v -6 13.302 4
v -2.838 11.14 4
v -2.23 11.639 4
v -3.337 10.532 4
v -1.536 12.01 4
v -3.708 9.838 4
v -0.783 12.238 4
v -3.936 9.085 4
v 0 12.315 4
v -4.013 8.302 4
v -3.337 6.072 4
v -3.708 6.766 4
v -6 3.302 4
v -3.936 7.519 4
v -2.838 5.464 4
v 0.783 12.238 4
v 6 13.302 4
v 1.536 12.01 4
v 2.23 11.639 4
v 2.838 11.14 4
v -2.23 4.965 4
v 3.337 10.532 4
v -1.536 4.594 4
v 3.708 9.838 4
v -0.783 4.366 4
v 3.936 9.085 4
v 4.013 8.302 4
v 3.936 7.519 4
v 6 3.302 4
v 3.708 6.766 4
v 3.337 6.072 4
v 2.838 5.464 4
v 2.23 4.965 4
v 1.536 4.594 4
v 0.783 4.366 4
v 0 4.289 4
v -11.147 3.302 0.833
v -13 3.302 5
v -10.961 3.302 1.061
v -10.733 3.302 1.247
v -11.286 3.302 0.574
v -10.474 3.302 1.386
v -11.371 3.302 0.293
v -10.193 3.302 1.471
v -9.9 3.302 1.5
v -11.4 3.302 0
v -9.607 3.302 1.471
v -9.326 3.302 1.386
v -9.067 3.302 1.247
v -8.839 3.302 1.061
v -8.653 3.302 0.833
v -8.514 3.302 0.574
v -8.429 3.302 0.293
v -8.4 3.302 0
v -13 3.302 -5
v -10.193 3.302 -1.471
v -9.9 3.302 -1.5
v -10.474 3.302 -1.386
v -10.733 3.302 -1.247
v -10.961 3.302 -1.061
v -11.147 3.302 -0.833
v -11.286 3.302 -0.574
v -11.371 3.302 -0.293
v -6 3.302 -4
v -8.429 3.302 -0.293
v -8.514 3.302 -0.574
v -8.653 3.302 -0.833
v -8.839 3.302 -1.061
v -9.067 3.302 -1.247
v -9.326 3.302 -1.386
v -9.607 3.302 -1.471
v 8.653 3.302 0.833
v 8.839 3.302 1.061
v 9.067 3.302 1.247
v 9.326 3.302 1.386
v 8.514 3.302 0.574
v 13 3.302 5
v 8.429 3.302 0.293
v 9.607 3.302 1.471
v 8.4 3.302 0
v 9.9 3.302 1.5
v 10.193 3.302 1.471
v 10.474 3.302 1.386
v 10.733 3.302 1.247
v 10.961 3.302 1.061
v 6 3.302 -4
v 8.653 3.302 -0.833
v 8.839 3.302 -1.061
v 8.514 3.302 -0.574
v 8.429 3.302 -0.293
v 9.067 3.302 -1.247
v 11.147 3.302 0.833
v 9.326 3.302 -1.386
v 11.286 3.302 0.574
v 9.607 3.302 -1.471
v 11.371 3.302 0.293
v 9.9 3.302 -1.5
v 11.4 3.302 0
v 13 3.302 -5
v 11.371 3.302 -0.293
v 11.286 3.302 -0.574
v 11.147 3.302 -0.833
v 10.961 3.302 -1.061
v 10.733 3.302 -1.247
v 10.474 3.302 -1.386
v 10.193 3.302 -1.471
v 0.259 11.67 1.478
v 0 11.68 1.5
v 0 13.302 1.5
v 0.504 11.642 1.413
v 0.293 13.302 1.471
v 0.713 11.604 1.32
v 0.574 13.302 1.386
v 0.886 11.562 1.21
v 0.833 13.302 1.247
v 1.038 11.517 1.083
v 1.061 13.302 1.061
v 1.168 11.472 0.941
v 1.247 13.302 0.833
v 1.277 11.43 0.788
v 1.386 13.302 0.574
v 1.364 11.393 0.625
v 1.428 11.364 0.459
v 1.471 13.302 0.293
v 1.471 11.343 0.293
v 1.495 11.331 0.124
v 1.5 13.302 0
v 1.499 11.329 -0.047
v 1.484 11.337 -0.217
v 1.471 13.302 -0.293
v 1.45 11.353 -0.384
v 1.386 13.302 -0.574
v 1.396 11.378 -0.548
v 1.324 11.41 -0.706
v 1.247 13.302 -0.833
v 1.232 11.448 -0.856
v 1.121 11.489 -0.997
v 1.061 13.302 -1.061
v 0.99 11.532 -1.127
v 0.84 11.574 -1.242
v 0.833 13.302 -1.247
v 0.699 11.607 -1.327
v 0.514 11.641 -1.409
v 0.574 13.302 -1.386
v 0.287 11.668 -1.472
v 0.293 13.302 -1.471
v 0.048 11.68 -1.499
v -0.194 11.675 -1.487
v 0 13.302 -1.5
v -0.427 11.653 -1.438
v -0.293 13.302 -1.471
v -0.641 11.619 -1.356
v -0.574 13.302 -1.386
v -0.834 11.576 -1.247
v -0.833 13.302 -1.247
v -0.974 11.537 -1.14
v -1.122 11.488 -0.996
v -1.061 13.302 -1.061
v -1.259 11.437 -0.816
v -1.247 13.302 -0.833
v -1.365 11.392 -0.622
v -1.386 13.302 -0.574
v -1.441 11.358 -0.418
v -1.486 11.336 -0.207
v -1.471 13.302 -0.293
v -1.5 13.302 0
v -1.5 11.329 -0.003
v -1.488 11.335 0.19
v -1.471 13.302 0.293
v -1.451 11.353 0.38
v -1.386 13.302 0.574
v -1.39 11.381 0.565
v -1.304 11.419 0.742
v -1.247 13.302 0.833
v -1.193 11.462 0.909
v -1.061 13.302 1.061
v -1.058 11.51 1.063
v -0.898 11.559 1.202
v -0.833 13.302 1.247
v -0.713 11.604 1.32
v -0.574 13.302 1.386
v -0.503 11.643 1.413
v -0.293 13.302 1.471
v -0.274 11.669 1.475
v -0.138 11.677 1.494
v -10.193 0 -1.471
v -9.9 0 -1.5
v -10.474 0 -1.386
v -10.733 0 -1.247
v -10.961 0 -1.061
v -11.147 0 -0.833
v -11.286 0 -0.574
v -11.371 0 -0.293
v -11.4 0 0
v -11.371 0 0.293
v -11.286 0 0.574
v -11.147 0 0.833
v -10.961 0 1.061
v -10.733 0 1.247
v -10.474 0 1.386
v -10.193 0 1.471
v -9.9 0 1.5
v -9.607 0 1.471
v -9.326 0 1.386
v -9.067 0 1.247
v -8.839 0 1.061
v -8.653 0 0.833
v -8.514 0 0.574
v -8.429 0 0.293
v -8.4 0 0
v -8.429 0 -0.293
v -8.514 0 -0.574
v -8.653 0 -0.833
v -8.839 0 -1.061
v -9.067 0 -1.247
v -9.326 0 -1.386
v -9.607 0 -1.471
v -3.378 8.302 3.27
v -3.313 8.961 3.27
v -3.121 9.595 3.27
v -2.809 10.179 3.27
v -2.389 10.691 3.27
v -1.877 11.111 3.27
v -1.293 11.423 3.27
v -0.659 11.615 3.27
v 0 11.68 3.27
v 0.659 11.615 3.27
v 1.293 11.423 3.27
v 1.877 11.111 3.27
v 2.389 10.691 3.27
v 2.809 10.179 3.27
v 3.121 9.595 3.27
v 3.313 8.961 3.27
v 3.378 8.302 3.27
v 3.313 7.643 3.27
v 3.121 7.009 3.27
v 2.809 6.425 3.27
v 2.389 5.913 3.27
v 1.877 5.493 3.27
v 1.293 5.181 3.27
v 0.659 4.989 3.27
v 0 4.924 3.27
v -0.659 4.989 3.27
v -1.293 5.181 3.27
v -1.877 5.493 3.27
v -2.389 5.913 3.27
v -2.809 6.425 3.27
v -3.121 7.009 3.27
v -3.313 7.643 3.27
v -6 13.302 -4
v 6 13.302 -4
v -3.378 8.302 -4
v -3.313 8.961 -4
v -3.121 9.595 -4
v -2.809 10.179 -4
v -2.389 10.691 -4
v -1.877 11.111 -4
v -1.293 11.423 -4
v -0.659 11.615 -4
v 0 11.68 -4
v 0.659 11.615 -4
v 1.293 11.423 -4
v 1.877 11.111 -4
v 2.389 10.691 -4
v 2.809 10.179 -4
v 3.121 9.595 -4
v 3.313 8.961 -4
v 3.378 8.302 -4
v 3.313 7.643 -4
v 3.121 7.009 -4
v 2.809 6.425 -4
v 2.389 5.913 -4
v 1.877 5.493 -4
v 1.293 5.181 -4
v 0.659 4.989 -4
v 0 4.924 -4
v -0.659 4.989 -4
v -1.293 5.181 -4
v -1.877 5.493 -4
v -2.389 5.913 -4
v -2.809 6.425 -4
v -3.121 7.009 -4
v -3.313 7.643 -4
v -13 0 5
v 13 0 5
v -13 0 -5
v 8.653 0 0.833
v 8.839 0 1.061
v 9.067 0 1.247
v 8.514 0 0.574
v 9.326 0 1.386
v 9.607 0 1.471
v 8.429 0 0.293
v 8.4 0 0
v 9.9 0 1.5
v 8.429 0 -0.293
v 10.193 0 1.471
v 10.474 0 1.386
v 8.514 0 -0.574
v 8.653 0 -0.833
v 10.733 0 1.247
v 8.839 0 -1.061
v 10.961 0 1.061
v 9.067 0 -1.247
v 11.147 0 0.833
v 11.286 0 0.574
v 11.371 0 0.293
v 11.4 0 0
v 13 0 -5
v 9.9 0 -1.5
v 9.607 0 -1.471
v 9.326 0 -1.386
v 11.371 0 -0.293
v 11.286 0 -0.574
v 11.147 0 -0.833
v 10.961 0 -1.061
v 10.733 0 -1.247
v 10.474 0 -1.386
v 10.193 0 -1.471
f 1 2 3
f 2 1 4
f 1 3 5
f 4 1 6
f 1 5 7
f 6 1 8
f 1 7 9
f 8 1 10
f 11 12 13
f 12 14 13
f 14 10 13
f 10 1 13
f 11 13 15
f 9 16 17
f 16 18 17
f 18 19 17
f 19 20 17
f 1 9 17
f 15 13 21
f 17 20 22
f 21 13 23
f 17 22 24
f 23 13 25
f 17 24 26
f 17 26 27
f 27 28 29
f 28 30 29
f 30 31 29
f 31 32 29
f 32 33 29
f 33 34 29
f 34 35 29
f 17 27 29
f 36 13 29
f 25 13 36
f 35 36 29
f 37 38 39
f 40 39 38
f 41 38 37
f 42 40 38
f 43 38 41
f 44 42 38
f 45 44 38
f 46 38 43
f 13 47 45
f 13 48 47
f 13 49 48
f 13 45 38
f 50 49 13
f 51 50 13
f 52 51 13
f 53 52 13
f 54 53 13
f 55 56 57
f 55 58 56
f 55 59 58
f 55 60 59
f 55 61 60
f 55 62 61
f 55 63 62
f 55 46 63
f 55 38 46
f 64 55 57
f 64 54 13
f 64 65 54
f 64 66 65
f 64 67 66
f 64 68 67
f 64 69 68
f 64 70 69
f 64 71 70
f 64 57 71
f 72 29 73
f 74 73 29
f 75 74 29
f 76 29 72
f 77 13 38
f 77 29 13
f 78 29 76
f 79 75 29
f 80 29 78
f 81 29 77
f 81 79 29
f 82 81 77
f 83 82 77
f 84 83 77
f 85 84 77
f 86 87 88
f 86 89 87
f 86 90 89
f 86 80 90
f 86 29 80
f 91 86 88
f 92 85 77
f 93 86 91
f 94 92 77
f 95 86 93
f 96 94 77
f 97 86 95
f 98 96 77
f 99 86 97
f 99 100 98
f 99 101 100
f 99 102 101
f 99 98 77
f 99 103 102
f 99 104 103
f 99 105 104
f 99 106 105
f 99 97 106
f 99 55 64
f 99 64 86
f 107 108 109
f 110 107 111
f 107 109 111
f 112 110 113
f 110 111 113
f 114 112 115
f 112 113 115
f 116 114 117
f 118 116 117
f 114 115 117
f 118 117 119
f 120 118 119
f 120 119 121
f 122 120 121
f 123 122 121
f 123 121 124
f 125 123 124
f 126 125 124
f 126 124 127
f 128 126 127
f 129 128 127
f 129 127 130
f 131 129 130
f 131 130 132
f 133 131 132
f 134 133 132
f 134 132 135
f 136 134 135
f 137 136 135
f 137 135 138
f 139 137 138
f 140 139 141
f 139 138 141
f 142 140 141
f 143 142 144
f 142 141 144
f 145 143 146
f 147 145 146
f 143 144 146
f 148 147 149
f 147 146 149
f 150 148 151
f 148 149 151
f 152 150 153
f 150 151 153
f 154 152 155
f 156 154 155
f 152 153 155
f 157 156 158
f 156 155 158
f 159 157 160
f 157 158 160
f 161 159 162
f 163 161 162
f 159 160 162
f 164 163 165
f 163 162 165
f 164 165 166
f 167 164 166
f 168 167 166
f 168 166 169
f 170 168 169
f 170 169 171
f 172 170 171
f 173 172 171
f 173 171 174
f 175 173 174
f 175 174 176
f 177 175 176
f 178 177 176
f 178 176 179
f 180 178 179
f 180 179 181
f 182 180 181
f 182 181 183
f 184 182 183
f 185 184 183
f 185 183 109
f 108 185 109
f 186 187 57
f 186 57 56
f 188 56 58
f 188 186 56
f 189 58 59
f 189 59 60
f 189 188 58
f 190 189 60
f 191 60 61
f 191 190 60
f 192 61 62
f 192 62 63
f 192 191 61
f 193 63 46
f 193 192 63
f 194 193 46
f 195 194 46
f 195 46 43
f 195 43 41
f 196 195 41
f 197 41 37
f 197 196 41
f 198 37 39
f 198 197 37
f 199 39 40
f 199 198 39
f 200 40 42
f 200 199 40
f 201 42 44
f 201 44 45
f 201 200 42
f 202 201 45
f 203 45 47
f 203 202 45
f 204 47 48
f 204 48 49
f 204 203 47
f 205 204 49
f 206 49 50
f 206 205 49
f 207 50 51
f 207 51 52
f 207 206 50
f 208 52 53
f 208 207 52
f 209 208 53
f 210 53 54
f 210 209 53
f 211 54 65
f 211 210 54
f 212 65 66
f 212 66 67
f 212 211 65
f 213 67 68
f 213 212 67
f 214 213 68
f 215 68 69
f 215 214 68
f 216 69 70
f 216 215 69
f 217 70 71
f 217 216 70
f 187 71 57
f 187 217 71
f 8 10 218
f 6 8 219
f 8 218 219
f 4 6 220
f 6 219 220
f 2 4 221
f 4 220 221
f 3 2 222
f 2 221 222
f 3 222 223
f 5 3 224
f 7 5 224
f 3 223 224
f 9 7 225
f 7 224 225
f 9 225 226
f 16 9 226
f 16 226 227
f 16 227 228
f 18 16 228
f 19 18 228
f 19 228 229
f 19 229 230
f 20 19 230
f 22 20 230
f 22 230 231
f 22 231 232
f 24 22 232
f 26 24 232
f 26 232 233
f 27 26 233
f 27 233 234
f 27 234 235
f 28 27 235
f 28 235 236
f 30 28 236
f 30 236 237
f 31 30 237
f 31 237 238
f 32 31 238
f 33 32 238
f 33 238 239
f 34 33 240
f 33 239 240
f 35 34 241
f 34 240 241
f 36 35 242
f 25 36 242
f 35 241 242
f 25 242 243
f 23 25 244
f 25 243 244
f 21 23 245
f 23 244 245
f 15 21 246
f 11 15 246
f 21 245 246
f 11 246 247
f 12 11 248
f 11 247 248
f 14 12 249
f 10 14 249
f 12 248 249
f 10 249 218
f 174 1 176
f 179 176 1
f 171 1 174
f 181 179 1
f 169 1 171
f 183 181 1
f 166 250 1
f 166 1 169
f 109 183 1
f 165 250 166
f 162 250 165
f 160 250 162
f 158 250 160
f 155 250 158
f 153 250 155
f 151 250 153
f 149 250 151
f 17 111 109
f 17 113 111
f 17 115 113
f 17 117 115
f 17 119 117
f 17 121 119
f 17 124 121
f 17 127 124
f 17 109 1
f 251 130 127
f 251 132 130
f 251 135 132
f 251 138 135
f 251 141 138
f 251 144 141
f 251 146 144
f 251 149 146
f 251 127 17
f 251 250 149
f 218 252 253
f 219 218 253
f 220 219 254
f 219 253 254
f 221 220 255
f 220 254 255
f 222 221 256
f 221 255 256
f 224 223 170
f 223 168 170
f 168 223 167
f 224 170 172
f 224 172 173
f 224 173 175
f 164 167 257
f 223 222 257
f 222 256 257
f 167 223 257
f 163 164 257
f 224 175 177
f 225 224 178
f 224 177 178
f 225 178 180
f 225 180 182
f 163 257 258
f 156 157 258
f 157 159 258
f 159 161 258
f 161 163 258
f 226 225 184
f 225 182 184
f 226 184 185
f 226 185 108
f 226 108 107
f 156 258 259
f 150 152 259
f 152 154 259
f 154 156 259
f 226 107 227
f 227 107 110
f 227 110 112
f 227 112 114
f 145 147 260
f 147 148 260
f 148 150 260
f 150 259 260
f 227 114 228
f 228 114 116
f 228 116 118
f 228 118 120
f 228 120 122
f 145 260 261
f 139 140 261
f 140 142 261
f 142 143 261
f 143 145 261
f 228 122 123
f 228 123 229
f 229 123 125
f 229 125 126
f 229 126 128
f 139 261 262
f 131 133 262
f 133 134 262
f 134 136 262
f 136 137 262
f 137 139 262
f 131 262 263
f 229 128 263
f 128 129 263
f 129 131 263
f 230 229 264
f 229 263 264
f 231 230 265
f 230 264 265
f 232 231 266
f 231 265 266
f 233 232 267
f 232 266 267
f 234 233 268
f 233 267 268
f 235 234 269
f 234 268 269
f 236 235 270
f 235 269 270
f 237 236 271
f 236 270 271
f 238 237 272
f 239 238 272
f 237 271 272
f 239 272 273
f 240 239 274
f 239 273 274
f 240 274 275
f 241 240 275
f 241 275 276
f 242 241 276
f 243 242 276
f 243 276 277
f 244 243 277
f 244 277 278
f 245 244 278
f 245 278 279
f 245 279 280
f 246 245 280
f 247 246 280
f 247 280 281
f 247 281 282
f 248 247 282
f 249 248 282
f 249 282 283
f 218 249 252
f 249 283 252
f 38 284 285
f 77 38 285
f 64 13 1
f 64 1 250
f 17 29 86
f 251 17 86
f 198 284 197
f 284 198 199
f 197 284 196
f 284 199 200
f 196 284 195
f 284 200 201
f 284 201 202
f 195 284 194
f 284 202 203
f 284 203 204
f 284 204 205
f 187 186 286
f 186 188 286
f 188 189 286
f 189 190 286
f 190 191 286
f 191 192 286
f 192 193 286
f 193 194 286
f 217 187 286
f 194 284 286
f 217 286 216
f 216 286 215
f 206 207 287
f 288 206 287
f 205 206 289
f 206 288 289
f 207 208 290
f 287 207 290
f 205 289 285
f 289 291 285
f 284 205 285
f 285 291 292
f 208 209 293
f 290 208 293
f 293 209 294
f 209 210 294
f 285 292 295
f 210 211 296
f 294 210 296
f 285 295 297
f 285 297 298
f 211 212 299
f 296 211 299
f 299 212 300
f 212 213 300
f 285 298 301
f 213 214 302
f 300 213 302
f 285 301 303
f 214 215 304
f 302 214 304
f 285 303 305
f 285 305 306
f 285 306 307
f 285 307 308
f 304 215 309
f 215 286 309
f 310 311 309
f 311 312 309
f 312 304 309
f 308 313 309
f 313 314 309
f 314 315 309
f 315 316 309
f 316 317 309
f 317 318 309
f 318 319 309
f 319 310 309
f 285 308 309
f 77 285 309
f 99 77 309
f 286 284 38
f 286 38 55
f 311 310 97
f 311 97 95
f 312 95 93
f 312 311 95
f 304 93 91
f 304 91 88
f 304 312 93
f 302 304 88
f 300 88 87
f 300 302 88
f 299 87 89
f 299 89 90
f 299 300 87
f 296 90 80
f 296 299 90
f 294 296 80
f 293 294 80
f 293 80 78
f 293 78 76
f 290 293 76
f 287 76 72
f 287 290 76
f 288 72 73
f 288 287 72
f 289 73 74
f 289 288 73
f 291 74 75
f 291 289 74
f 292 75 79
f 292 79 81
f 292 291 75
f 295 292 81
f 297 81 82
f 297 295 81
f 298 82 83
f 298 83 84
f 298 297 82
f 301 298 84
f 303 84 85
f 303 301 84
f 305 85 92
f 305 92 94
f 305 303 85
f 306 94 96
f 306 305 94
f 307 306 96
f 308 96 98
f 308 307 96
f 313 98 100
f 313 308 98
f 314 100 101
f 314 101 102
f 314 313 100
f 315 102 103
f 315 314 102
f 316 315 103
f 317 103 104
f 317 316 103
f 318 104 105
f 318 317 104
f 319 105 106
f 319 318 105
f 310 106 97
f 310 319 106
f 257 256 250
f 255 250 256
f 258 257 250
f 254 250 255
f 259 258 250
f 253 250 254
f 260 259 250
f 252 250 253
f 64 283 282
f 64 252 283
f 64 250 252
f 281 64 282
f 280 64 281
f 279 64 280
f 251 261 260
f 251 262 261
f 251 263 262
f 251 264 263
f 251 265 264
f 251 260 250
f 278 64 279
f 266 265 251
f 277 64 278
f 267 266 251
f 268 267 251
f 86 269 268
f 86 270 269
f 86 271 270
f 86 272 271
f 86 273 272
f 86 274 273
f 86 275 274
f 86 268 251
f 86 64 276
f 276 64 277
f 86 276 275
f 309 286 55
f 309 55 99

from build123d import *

# Parameters (mm, degrees)
SKETCH1_W                               = 26
SKETCH1_H                               = 10
SKETCH1_R                               = 1.5
BOSS_EXTRUDE5_DEPTH                     = 3.302
CROQUIS7_W                              = 12
CROQUIS7_H                              = 8
SALIENTE_EXTRUIR2_DEPTH                 = 10
TALADRO_DE_MARGEN_PARA_1_43_D           = 6.7564
TALADRO_DE_MARGEN_PARA_1_43_CSINK_D     = 8.0264
TALADRO_DE_MARGEN_PARA_1_43_CSINK_ANGLE = 82
CROQUIS13_R                             = 1.5
CORTAR_EXTRUIR3_DEPTH                   = 3


with BuildPart() as part:
    # Sketch1 → Boss-Extrude5 (new body)
    with BuildSketch(Plane(origin=(0, 0, 0), x_dir=(1, 0, 0), z_dir=(0, 1, 0))):
        Rectangle(SKETCH1_W, SKETCH1_H)
        with Locations(Location((-9.9, 0, 0), (0, 0, 90))):
            Circle(SKETCH1_R, mode=Mode.SUBTRACT)
        with Locations(Location((9.9, 0, 0), (0, 0, 90))):
            Circle(SKETCH1_R, mode=Mode.SUBTRACT)
    extrude(amount=BOSS_EXTRUDE5_DEPTH)

    # Croquis7 → Saliente-Extruir2 (add)
    with BuildSketch(Plane(origin=(0, 3.302, 0), x_dir=(1, 0, 0), z_dir=(0, 1, 0))):
        Rectangle(CROQUIS7_W, CROQUIS7_H)
    extrude(amount=SALIENTE_EXTRUIR2_DEPTH)

    # Taladro de margen para 1/43 (through all)
    with Locations(Plane.XY.offset(4)):
        with Locations((0, 8.302)):
            CounterSinkHole(TALADRO_DE_MARGEN_PARA_1_43_D / 2, TALADRO_DE_MARGEN_PARA_1_43_CSINK_D / 2, counter_sink_angle=TALADRO_DE_MARGEN_PARA_1_43_CSINK_ANGLE)

    # Croquis13 → Cortar-Extruir3 (cut)
    with BuildSketch(Plane(origin=(0, 13.302, 0), x_dir=(1, 0, 0), z_dir=(0, 1, 0))):
        with Locations(Location((0, 0, 0), (0, 0, 270))):
            Circle(CROQUIS13_R)
    extrude(amount=-CORTAR_EXTRUIR3_DEPTH, mode=Mode.SUBTRACT)


solid = part.part
